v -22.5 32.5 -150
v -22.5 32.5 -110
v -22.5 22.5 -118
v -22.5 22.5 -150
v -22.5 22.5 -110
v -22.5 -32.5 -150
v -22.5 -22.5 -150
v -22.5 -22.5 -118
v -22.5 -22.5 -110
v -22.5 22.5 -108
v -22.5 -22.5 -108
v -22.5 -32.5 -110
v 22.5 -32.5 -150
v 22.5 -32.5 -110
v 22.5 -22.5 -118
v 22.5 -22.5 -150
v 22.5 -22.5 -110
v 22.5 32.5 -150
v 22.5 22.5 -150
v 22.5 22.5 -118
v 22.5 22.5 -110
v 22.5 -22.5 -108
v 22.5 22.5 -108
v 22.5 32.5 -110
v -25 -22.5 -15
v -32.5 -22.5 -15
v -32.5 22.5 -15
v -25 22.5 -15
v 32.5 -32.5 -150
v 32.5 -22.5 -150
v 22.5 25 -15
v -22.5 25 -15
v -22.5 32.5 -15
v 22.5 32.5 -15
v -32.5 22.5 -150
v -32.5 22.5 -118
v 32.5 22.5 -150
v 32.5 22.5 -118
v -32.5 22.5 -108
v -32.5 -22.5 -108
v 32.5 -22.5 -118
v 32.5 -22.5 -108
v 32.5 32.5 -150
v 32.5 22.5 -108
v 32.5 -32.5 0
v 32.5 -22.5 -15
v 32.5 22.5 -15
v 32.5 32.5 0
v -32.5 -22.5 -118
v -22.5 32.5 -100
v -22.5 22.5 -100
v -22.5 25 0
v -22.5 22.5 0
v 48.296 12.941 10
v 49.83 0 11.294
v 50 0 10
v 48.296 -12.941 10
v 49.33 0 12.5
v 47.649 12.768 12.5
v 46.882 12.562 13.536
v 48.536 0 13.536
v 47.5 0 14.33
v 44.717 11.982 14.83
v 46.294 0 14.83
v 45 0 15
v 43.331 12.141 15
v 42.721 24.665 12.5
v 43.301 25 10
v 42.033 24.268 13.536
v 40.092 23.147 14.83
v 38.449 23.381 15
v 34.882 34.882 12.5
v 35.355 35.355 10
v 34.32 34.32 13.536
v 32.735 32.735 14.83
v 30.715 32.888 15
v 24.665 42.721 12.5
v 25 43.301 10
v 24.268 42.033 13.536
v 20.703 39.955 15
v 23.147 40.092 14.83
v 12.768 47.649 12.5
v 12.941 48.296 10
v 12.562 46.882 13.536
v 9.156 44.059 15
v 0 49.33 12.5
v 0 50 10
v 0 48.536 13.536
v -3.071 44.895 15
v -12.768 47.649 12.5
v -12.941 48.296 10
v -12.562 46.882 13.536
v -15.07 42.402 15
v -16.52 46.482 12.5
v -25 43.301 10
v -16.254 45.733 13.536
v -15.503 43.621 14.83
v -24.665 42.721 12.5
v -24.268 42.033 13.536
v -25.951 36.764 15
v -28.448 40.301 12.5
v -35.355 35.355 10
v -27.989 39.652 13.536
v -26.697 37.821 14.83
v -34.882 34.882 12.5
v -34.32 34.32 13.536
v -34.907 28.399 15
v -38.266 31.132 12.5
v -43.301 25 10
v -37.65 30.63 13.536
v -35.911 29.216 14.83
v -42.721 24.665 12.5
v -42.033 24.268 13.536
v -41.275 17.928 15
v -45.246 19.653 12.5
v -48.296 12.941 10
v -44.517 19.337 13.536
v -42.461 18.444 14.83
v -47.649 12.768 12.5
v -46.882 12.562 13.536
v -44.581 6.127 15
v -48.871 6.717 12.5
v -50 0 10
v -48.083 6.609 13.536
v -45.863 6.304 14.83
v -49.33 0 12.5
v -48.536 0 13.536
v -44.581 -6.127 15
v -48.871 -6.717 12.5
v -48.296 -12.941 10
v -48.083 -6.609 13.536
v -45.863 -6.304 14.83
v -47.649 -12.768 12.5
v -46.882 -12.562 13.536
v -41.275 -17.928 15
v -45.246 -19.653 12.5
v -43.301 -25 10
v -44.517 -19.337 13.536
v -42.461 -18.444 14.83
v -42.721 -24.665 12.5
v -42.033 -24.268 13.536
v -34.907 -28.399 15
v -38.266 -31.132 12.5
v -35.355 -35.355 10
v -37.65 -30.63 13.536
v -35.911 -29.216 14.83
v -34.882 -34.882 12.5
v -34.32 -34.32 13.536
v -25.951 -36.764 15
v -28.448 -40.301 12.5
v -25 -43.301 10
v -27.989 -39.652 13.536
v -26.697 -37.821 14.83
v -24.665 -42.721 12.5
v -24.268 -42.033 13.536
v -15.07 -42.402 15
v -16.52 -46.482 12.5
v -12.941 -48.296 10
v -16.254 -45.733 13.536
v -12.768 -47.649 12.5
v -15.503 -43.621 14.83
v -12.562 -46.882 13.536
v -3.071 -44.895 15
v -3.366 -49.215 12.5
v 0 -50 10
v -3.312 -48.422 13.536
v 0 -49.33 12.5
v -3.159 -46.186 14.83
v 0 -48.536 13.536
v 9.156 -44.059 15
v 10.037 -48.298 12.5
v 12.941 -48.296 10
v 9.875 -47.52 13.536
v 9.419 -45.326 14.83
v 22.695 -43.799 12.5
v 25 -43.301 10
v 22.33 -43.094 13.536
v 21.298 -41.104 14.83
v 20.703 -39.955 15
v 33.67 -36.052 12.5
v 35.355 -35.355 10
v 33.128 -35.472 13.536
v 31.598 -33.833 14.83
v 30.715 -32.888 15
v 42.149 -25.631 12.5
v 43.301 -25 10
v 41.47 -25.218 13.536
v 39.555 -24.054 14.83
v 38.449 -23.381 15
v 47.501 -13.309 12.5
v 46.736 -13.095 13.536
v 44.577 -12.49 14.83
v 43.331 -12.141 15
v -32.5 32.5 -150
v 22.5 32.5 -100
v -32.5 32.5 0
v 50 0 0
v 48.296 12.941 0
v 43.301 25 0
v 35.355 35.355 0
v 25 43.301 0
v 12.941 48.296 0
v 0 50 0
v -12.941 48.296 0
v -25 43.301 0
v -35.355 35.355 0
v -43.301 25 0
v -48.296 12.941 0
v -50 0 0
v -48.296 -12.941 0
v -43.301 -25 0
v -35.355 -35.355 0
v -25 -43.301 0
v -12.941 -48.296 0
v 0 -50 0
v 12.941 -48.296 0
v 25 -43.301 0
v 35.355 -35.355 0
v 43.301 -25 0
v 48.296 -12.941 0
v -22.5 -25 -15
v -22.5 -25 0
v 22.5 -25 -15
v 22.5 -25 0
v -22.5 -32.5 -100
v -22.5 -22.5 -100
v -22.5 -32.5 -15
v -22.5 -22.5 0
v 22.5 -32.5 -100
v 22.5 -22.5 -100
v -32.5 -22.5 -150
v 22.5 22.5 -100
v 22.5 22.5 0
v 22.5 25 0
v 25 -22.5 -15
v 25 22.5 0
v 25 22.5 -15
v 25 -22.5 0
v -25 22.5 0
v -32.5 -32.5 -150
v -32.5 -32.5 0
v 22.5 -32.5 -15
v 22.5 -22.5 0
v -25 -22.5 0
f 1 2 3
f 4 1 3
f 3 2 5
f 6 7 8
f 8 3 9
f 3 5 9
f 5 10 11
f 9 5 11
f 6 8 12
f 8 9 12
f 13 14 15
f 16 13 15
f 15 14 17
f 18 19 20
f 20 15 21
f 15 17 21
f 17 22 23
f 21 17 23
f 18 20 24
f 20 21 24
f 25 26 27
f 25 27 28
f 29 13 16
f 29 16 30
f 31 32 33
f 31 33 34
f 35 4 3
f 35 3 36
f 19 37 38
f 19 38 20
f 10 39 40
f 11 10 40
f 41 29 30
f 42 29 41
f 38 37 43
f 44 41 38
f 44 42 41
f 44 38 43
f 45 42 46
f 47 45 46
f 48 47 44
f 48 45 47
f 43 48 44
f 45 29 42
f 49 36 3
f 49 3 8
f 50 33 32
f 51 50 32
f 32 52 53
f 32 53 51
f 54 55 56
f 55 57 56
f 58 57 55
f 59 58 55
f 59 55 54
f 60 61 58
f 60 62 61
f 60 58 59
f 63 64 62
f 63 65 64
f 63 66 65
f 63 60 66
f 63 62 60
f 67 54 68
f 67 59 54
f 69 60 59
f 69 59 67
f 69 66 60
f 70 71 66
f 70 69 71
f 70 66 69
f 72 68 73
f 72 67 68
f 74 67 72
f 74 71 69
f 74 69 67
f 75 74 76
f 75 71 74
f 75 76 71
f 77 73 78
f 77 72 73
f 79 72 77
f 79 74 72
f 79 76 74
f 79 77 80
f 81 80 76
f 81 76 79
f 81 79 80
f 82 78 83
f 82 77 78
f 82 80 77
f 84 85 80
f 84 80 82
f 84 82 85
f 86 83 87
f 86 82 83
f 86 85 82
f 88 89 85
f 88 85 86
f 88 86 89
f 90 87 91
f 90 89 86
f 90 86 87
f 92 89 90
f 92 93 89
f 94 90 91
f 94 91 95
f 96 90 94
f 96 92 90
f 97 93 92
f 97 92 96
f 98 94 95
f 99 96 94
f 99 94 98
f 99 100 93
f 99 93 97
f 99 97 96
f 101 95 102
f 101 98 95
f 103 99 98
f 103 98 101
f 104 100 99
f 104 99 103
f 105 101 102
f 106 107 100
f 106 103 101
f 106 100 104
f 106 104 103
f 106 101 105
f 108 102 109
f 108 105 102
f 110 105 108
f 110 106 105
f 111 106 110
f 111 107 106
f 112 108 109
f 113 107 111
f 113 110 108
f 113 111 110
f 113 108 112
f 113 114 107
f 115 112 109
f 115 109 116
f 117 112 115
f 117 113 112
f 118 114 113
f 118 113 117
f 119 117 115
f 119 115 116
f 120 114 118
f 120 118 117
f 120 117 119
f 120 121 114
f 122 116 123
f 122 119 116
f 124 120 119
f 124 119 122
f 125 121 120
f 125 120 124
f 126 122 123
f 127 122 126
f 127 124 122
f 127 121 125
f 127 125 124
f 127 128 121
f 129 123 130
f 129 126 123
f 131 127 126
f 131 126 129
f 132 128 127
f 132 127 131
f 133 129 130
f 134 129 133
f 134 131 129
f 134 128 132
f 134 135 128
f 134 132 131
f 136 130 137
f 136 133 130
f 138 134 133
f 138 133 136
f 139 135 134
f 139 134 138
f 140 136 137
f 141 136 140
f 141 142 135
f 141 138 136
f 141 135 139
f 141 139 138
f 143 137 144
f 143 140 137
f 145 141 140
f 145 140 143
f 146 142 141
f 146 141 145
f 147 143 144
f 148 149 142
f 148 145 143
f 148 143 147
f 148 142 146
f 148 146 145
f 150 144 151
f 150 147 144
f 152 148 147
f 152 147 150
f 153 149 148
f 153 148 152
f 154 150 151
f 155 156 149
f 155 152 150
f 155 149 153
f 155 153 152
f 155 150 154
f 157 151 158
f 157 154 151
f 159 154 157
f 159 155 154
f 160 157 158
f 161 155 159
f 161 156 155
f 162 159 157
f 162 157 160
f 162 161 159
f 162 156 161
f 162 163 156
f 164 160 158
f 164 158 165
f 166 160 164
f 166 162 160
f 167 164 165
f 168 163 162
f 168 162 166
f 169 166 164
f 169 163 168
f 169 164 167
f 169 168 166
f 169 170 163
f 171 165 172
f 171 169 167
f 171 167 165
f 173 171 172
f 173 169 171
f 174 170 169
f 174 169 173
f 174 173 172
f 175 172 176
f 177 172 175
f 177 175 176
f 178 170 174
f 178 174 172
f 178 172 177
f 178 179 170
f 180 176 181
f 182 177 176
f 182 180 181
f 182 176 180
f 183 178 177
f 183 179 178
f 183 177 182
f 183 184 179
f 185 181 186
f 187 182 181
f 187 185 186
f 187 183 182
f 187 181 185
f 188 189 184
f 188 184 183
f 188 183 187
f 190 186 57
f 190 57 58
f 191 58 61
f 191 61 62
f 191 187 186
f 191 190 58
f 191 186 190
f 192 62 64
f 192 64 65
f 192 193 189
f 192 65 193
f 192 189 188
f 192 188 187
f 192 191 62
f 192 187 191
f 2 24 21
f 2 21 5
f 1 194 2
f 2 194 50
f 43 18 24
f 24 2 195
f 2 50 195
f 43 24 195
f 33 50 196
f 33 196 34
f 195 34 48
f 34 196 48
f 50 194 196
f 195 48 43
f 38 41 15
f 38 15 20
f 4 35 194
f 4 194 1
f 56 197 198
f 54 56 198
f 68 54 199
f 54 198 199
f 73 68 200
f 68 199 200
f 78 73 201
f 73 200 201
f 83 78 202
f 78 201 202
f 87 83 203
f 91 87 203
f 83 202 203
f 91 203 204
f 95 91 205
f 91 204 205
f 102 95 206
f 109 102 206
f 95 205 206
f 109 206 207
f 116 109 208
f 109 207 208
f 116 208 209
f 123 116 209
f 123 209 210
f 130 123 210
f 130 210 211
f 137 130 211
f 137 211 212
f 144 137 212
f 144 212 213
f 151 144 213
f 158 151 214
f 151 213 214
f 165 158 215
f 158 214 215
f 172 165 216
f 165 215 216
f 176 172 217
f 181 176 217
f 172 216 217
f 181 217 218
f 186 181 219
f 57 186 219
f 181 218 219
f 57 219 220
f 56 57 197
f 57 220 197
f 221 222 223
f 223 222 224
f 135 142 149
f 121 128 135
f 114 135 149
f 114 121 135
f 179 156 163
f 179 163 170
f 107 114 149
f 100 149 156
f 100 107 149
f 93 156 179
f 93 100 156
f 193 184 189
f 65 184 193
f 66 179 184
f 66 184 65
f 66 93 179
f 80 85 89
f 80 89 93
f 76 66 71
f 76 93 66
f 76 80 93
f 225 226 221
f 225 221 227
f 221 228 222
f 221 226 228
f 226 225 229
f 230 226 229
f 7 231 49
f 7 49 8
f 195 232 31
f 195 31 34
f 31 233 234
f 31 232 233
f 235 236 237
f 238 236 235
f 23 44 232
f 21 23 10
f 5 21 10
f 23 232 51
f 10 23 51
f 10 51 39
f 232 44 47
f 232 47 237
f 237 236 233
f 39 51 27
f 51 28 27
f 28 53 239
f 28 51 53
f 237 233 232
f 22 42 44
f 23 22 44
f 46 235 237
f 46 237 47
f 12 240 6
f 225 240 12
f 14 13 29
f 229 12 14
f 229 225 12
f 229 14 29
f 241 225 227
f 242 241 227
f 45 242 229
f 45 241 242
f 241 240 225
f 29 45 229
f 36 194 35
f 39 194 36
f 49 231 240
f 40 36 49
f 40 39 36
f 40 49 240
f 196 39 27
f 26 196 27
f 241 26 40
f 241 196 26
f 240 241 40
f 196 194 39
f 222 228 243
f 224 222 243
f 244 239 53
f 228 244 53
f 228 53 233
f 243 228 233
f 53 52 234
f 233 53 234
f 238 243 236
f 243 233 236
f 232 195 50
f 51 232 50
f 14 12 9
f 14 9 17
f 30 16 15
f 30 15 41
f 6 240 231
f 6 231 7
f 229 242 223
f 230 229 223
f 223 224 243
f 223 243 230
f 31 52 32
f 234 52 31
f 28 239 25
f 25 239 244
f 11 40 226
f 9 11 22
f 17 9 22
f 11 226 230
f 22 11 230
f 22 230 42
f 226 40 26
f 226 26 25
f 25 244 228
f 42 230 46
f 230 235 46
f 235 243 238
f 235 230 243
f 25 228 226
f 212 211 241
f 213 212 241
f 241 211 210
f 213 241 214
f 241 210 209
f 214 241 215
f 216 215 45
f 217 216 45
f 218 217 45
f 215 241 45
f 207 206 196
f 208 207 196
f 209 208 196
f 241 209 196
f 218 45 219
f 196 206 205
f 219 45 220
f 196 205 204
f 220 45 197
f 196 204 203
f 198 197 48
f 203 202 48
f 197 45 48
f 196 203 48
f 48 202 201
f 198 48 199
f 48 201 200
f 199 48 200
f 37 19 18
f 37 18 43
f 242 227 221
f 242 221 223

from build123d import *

# Parameters (mm, degrees)
F0_R      = 50
F1_DEPTH  = 15
F2_W      = 45
F2_H      = 7.5
F2_W_2    = 7.5
F2_H_2    = 45
F3_DEPTH  = 15
F5_DEPTH  = 150
F6_W      = 45
F6_H      = 10
F7_DEPTH  = 10
F8_W      = 45
F8_H      = 10
F9_DEPTH  = 10
F10_W     = 45
F10_H     = 10
F11_DEPTH = 10
F12_W     = 45
F12_H     = 10
F13_DEPTH = 10
F14_R     = 5


with BuildPart() as f1:
    # F0 (on Top) → F1 (new body)
    with BuildSketch(Plane.XY):
        Circle(F0_R)
    extrude(amount=F1_DEPTH)

    # F2 (on face) → F3 (join)
    with BuildSketch(Plane(origin=(0, 0, 0), x_dir=(1, 0, 0), z_dir=(0, 0, -1))):
        with Locations((0, 28.75)):
            Rectangle(F2_W, F2_H)
        with Locations((-28.75, 0)):
            Rectangle(F2_W_2, F2_H_2)
        with Locations((28.75, 0)):
            Rectangle(F2_W_2, F2_H_2)
        with Locations((0, -28.75)):
            Rectangle(F2_W, F2_H)
    extrude(amount=F3_DEPTH)

    # F4 (on face) → F5 (join)
    with BuildSketch(Plane(origin=(0, 0, 0), x_dir=(1, 0, 0), z_dir=(0, 0, -1))):
        Polygon((-25, -22.5), (-32.5, -22.5), (-32.5, -32.5), (-22.5, -32.5), (-22.5, -25), (-22.5, -22.5), align=None)
        Polygon((-22.5, 32.5), (-32.5, 32.5), (-32.5, 22.5), (-25, 22.5), (-22.5, 22.5), (-22.5, 25), align=None)
        Polygon((32.5, 32.5), (22.5, 32.5), (22.5, 25), (22.5, 22.5), (25, 22.5), (32.5, 22.5), align=None)
        Polygon((32.5, -32.5), (32.5, -22.5), (25, -22.5), (22.5, -22.5), (22.5, -25), (22.5, -32.5), align=None)
    extrude(amount=F5_DEPTH)

    # F6 (on face) → F7 (join)
    with BuildSketch(Plane.XZ.offset(32.5)):
        with Locations((0, -105)):
            Rectangle(F6_W, F6_H)
    extrude(amount=-F7_DEPTH)

    # F8 (on face) → F9 (join)
    with BuildSketch(Plane(origin=(0, 32.5, 0), x_dir=(-1, 0, 0), z_dir=(0, 1, 0))):
        with Locations((0, -105)):
            Rectangle(F8_W, F8_H)
    extrude(amount=-F9_DEPTH)

    # F10 (on face) → F11 (join)
    with BuildSketch(Plane(origin=(-32.5, 0, 0), x_dir=(0, -1, 0), z_dir=(-1, 0, 0))):
        with Locations((0, -113)):
            Rectangle(F10_W, F10_H)
    extrude(amount=-F11_DEPTH)

    # F12 (on face) → F13 (join)
    with BuildSketch(Plane.YZ.offset(32.5)):
        with Locations((0, -113)):
            Rectangle(F12_W, F12_H)
    extrude(amount=-F13_DEPTH)

    # F14
    f14_edges = [f1.edges().sort_by_distance(p)[0] for p in [
        (-50, 0, 15),
    ]]
    fillet(f14_edges, radius=F14_R)


solid = f1.part
